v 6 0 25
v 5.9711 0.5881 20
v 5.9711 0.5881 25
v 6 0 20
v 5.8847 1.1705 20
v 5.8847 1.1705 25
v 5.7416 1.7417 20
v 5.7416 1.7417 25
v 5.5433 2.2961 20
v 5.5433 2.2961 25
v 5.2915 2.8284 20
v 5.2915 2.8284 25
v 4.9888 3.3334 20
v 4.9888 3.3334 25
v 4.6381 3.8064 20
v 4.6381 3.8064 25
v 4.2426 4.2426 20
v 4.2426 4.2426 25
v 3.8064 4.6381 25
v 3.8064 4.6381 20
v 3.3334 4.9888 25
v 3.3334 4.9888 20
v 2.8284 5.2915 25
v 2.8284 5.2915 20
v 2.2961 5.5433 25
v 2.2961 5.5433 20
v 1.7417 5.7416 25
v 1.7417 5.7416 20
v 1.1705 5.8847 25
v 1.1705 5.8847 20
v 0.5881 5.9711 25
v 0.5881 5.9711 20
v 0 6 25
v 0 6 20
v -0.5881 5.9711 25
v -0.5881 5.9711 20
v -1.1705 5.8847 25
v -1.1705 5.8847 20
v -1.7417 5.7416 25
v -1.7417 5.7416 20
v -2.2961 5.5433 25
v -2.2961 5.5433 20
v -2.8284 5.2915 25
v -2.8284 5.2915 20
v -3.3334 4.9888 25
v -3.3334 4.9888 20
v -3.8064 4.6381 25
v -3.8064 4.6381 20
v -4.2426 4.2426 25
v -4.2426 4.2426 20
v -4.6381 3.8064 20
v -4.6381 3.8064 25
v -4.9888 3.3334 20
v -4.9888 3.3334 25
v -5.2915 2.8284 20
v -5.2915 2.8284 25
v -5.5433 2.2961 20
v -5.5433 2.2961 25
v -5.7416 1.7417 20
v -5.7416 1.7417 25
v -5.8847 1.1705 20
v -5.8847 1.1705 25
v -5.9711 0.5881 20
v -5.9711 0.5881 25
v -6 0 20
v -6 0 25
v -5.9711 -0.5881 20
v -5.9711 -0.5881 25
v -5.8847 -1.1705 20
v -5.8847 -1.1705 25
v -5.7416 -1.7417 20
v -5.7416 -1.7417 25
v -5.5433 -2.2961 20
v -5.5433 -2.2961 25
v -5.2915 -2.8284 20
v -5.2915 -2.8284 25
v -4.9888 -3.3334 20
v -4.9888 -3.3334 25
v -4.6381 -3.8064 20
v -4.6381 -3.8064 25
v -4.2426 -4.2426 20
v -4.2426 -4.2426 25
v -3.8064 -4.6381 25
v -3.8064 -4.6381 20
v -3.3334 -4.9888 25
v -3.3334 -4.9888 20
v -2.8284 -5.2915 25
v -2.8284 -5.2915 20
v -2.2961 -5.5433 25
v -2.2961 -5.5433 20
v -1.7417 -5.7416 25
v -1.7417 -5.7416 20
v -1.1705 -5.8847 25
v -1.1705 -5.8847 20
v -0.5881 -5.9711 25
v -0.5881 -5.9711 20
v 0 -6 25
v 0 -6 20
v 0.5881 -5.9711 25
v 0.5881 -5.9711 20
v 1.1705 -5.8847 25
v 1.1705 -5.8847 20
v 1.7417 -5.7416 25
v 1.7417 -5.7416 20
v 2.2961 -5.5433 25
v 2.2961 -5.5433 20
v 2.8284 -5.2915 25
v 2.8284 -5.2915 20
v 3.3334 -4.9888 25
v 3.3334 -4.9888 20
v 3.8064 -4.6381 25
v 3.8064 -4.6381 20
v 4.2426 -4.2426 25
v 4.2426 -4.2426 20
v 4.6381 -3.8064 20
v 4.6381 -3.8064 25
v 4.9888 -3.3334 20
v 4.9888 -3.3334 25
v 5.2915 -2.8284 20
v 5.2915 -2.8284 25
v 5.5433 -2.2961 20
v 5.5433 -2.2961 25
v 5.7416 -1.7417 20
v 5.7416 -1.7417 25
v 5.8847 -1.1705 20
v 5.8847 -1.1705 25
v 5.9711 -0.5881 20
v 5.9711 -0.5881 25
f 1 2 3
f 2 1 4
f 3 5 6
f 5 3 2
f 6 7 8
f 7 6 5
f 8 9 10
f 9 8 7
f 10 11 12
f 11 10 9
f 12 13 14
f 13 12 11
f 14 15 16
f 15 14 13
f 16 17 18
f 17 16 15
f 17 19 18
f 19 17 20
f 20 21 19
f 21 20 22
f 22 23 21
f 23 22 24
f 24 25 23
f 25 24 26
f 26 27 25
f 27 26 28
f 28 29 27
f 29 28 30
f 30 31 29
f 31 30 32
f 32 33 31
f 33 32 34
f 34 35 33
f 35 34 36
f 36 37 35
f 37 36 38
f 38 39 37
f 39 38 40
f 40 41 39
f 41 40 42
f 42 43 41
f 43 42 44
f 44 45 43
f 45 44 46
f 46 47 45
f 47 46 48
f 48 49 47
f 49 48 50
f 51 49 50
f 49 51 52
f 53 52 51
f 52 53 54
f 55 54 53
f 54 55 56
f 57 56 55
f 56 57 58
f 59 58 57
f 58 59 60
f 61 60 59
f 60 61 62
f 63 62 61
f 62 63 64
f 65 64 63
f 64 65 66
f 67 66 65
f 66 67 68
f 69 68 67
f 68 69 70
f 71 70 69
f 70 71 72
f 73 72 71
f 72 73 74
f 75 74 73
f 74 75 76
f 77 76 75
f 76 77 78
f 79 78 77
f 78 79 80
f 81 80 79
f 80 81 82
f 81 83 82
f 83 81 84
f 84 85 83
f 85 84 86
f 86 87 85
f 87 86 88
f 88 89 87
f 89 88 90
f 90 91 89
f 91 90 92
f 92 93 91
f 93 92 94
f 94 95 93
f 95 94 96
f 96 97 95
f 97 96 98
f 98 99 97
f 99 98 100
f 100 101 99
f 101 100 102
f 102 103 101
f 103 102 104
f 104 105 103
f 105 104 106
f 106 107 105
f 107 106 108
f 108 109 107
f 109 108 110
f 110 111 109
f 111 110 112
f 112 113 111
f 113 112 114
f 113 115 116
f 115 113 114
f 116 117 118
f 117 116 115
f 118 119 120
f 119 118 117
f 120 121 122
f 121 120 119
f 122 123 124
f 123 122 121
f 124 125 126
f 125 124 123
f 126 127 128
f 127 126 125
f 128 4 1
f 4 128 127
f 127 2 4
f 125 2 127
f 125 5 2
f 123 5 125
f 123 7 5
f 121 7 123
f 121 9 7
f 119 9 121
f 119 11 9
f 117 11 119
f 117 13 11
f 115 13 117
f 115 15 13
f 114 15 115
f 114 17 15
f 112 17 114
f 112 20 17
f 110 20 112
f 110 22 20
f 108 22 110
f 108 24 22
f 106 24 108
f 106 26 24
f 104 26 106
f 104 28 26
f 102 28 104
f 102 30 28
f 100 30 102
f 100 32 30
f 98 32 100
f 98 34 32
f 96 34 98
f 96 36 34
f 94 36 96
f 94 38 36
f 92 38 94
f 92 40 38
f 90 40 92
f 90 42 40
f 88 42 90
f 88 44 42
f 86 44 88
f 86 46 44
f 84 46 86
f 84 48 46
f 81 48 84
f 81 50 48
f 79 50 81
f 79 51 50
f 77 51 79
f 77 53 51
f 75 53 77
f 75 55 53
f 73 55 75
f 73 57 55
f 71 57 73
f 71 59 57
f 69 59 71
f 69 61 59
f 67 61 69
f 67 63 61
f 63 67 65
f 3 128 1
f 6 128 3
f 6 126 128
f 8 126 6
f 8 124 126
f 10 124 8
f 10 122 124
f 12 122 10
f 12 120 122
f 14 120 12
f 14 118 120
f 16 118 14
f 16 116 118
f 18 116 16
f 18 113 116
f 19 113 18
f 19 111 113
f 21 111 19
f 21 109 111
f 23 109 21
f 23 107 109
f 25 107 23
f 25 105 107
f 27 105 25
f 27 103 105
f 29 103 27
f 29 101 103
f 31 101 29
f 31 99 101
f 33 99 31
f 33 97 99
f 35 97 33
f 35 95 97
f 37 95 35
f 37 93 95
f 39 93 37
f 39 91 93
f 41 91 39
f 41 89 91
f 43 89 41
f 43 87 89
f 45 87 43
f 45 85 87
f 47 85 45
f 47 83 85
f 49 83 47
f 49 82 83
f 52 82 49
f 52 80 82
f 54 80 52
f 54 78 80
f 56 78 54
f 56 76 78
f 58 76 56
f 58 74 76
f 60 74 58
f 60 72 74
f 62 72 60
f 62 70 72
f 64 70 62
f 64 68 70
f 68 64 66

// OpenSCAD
// Straight hose-barb reducer: 8 mm tubing to 5 mm tubing
// Print orientation: standing upright along +Z, centred on the origin in X/Y.
// The two barbs at each end are stacked (one above the other) and may overlap slightly.

$fn = 64;

// ---------------- Dimensions (mm) ----------------
reducer_id      = 8;    // inner diameter of the 8 mm tubing
reducer_od      = 5;    // inner diameter of the 5 mm tubing
barb_count      = 2;    // number of barbs at each end (stacked)
barb_height_8   = 10;   // height of each 8 mm barb, from z = 0 to z = 20
barb_od_start_8 = 7.5;  // outer diameter of the 8 mm barbs at their bottom
barb_od_end_8   = 9.5;  // outer diameter of the 8 mm barbs at their top
barb_height_5   = 8;    // height of each 5 mm barb, from z = 25 to z = 41
barb_od_start_5 = 6.5;  // outer diameter of the 5 mm barbs at their bottom
barb_od_end_5   = 5.0;  // outer diameter of the 5 mm barbs at their top
collar_od       = 12;   // outer diameter of the cylindrical collar (z = 20 to 25)
eps             = 0.5;   // overshoot so cutters pass through faces

// Derived
reducer_length  = 41;   // overall length along Z
overlap         = 0.5;  // how far the stacked barbs overlap each other

// ---------------- Model ----------------
union() {
    // 8 mm tubing end: two barbs, stacked, from z = 0 to z = 20
    for (i = [0 : barb_count - 1]) {
        translate([0, 0, i * (barb_height_8 + overlap)])
            linear_extrude(height = barb_height_8 + overlap)
                polygon(d = barb_od_start_8 + (barb_od_end_8 - barb_od_start_8) *
                         [0, 1][i < (barb_count - 1 / 2)], r = eps);
    }

    // Cylindrical collar from z = 20 to z = 25
    translate([0, 0, 20])
        cylinder(h = 5, d = collar_od);

    // 5 mm tubing end: two barbs, stacked, from z = 25 to z = 41
    for (i = [0 : barb_count - 1]) {
        translate([0, 0, 25 + i * (barb_height_5 + overlap)])
            linear_extrude(height = barb_height_5 + overlap)
                polygon(d = barb_od_start_5 + (barb_od_end_5 - barb_od_start_5) *
                         [0, 1][i < (barb_count - 1 / 2)], r = eps);
    }
}

// ---------------- Bore ----------------
// A 3 mm bore runs straight through the full length of the part
translate([0, 0, -eps])
    rotate_extrude()
        translate([0, -1.5, 0])
            cube([reducer_length + 2 * eps, 3, 1]);
